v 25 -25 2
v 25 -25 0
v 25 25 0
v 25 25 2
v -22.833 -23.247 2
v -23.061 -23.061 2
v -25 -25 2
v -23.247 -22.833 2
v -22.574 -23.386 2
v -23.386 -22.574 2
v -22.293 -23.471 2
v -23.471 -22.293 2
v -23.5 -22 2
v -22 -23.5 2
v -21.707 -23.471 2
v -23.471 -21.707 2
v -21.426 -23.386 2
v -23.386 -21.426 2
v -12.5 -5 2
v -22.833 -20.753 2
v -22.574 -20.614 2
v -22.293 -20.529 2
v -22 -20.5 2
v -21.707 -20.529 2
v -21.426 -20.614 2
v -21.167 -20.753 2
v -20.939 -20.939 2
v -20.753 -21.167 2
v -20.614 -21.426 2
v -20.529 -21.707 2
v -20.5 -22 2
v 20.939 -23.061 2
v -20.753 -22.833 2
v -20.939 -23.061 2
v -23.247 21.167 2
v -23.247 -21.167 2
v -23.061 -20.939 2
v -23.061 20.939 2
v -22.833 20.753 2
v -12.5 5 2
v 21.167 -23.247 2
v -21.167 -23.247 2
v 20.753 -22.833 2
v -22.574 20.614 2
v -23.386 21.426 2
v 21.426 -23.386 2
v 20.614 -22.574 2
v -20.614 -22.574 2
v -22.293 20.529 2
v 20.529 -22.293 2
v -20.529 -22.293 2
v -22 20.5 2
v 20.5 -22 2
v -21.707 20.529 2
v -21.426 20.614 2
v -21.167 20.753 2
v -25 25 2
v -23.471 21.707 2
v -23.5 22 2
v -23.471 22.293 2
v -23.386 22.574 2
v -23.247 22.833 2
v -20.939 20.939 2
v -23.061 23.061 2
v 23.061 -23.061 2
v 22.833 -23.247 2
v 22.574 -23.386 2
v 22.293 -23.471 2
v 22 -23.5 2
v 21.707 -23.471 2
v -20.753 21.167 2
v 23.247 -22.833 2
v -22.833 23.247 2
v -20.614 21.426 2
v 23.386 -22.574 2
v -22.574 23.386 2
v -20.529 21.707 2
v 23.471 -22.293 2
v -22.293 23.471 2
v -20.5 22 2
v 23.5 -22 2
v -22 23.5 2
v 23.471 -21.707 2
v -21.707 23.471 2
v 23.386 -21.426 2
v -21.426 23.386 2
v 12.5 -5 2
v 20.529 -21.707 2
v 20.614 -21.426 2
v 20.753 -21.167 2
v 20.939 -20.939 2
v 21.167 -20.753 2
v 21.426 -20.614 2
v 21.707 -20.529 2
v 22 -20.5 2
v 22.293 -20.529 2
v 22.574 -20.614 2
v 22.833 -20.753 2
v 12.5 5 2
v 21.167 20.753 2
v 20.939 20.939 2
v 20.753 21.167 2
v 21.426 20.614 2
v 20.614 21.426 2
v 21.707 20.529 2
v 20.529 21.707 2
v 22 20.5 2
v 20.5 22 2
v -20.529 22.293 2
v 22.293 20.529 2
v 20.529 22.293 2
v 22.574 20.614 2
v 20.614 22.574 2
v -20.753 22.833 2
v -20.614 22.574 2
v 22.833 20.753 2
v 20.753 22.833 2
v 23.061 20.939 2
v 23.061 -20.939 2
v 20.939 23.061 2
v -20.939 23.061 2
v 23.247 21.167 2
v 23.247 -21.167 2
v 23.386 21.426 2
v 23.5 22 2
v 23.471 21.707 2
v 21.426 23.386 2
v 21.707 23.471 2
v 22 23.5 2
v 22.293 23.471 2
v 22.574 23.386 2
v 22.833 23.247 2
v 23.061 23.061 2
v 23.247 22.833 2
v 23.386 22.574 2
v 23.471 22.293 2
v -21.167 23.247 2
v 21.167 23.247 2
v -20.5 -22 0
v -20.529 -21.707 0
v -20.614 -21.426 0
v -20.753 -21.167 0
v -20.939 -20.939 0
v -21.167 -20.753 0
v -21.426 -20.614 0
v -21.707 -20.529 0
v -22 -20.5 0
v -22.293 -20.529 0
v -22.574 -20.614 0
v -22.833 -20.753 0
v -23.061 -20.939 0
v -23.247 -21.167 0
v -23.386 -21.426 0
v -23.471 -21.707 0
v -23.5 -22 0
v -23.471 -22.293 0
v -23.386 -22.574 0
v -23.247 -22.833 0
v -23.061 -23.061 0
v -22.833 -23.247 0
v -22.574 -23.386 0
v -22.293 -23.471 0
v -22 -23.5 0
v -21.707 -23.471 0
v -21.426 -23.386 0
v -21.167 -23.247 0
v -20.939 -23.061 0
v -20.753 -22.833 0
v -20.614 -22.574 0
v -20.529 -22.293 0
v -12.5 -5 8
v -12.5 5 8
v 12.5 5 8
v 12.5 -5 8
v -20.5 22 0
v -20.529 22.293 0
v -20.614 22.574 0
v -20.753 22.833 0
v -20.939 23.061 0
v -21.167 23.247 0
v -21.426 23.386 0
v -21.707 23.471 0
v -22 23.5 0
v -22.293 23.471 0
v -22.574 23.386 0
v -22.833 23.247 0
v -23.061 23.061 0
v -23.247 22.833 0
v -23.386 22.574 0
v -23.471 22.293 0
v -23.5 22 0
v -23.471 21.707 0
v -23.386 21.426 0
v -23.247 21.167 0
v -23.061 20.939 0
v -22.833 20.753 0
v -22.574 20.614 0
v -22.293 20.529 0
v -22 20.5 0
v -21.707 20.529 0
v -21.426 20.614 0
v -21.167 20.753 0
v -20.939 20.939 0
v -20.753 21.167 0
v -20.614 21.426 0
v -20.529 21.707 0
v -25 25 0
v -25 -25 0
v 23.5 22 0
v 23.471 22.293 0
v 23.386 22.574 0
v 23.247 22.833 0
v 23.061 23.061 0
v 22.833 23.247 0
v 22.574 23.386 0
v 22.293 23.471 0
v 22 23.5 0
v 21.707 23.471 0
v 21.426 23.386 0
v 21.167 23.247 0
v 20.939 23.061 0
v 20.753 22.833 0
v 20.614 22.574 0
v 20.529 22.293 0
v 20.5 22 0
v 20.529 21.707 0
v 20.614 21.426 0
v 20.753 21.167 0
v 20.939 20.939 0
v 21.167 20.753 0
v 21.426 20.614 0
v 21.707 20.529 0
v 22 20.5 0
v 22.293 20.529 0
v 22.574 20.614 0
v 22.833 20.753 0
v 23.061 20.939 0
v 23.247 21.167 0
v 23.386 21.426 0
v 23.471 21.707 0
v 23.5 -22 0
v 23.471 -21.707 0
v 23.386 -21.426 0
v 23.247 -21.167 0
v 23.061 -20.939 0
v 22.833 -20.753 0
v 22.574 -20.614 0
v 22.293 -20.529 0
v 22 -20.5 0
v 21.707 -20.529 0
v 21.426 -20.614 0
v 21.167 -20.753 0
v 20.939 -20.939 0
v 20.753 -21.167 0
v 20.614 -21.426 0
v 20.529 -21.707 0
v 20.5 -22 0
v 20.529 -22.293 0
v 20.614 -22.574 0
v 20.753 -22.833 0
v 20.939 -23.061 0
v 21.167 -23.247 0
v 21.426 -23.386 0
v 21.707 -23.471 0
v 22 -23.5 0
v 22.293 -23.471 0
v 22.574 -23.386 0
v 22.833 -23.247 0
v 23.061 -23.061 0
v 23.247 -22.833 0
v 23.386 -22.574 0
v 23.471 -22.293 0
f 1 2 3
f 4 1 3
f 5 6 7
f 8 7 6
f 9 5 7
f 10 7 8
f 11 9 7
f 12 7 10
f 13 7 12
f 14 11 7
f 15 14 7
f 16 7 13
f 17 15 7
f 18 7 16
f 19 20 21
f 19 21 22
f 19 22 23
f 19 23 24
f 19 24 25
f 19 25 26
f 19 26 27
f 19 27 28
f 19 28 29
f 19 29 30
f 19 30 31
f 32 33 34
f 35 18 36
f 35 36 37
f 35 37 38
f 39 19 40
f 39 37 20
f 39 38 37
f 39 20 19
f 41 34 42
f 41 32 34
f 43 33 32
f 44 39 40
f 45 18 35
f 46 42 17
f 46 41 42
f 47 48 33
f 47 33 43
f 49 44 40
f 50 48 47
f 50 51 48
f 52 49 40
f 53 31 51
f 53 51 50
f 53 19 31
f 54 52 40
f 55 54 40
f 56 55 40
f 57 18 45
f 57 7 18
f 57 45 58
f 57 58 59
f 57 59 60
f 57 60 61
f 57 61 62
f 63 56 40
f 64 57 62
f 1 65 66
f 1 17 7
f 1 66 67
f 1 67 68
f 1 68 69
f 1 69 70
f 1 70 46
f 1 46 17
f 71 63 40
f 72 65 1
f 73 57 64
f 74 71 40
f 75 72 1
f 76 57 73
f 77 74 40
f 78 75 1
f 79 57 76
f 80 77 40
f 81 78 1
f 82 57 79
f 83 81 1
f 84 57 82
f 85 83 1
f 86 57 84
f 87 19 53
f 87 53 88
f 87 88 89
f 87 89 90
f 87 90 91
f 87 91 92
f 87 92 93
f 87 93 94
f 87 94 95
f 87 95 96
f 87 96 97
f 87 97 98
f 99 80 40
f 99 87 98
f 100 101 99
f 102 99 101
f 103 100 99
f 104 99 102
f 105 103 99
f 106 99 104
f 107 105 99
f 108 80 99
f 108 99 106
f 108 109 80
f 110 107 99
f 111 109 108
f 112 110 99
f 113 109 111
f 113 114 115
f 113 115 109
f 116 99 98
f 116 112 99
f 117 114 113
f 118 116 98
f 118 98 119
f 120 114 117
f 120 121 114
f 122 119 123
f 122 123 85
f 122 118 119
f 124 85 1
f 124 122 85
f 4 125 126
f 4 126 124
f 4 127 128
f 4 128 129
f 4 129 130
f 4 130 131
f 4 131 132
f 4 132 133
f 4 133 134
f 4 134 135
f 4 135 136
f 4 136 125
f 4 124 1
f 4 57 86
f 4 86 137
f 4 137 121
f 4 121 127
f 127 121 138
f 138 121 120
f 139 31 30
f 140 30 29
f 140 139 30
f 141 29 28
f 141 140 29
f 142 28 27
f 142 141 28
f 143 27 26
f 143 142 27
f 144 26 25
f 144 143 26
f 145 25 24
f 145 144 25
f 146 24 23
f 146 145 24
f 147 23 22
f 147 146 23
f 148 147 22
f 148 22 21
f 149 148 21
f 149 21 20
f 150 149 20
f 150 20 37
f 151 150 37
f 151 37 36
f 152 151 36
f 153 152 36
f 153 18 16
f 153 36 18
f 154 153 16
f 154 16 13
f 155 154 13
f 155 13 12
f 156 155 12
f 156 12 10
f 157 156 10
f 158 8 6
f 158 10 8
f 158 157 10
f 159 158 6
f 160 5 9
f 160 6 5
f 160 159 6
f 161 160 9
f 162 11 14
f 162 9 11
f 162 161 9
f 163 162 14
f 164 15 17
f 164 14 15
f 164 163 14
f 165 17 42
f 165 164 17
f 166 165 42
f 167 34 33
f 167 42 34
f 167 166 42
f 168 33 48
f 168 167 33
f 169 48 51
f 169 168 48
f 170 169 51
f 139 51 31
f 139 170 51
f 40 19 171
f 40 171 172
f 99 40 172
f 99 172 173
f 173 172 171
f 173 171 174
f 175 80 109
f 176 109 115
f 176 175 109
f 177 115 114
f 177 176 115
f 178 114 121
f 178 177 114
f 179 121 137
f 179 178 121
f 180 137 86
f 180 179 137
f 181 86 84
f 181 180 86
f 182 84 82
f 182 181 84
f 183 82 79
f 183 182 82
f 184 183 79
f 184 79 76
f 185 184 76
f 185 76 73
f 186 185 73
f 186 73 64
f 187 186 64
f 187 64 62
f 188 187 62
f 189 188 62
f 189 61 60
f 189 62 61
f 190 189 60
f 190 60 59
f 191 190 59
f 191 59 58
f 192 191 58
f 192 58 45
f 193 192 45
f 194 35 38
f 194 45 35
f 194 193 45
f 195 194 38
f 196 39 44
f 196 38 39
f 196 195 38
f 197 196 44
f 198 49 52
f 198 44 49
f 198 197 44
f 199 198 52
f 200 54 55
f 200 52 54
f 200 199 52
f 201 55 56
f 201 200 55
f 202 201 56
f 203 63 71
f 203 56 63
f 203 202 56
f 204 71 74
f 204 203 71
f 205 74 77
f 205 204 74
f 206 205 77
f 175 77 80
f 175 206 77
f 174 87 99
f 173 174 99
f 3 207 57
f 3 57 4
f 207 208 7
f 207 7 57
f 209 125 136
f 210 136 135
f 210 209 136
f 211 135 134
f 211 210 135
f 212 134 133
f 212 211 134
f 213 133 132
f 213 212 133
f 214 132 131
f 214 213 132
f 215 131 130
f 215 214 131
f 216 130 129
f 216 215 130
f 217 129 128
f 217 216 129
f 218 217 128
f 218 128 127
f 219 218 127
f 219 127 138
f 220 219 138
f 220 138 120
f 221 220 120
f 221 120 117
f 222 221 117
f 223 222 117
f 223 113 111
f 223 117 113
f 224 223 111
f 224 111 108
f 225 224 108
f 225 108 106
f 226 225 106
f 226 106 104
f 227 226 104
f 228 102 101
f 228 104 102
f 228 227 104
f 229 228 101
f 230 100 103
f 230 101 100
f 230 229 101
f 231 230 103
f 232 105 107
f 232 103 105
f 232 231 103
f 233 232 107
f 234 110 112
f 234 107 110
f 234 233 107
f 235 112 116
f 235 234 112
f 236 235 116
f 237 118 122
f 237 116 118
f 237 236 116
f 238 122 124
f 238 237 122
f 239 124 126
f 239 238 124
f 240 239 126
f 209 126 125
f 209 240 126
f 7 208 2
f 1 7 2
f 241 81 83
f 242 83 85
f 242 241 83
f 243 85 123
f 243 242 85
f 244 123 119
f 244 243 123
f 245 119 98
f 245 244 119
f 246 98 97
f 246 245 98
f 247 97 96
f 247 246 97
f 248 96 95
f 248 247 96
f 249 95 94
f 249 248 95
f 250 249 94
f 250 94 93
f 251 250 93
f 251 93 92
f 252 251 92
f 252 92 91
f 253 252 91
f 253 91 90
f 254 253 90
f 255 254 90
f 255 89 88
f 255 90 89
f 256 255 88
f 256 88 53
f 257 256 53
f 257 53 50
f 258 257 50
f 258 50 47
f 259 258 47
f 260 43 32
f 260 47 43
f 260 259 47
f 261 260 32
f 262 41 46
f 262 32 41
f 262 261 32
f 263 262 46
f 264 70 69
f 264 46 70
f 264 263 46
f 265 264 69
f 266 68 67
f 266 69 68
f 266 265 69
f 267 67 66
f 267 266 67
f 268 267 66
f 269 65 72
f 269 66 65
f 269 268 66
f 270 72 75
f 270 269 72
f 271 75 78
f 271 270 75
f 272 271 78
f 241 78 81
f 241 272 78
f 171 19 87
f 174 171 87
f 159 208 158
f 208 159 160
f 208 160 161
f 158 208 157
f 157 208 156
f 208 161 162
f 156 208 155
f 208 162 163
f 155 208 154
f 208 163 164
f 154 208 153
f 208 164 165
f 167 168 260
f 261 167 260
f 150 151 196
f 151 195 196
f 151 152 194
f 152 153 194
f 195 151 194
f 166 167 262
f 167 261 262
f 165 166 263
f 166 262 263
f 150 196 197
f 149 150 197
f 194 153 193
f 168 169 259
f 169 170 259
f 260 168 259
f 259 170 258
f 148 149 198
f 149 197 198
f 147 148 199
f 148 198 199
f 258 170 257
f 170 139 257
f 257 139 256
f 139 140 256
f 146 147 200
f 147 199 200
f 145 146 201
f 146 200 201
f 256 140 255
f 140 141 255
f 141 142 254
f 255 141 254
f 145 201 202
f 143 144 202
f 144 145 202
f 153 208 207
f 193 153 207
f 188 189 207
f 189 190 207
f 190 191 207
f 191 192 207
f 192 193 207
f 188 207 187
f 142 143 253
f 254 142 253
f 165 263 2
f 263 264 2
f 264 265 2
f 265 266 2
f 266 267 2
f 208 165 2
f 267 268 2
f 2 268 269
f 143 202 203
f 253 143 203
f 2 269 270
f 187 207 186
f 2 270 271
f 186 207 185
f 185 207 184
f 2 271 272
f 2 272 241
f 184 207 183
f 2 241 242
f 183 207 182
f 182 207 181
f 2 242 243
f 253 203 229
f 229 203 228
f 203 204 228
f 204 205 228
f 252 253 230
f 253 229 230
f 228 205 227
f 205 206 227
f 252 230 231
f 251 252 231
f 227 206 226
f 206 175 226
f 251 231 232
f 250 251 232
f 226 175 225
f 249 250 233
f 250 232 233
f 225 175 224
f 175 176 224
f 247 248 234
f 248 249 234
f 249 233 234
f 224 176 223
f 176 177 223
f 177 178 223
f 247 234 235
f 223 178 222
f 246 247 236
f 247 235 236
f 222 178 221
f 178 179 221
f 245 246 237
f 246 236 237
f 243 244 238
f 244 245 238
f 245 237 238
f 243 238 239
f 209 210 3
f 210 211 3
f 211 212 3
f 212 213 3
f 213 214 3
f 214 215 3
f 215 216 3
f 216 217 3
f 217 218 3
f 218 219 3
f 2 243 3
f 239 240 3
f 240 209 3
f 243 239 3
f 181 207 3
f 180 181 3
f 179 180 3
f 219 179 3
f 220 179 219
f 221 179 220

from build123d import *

# Parameters (mm, degrees)
F0_W     = 50
F0_H     = 50
F1_DEPTH = 2
F2_R     = 1.5
F3_DEPTH = 2.001
F4_W     = 25
F4_H     = 10
F5_DEPTH = 6


with BuildPart() as f1:
    # F0 (on Top) → F1 (new body)
    with BuildSketch(Plane.XY):
        Rectangle(F0_W, F0_H)
    extrude(amount=F1_DEPTH)

    # F2 (on Top) → F3 (cut, through all)
    with BuildSketch(Plane.XY):
        with Locations((-22, 22)):
            Circle(F2_R)
        with Locations((-22, -22)):
            Circle(F2_R)
        with Locations((22, -22)):
            Circle(F2_R)
        with Locations((22, 22)):
            Circle(F2_R)
    extrude(amount=F3_DEPTH, mode=Mode.SUBTRACT)

    # F4 (on face) → F5 (join)
    with BuildSketch(Plane.XY.offset(2)):
        Rectangle(F4_W, F4_H)
    extrude(amount=F5_DEPTH)


solid = f1.part
